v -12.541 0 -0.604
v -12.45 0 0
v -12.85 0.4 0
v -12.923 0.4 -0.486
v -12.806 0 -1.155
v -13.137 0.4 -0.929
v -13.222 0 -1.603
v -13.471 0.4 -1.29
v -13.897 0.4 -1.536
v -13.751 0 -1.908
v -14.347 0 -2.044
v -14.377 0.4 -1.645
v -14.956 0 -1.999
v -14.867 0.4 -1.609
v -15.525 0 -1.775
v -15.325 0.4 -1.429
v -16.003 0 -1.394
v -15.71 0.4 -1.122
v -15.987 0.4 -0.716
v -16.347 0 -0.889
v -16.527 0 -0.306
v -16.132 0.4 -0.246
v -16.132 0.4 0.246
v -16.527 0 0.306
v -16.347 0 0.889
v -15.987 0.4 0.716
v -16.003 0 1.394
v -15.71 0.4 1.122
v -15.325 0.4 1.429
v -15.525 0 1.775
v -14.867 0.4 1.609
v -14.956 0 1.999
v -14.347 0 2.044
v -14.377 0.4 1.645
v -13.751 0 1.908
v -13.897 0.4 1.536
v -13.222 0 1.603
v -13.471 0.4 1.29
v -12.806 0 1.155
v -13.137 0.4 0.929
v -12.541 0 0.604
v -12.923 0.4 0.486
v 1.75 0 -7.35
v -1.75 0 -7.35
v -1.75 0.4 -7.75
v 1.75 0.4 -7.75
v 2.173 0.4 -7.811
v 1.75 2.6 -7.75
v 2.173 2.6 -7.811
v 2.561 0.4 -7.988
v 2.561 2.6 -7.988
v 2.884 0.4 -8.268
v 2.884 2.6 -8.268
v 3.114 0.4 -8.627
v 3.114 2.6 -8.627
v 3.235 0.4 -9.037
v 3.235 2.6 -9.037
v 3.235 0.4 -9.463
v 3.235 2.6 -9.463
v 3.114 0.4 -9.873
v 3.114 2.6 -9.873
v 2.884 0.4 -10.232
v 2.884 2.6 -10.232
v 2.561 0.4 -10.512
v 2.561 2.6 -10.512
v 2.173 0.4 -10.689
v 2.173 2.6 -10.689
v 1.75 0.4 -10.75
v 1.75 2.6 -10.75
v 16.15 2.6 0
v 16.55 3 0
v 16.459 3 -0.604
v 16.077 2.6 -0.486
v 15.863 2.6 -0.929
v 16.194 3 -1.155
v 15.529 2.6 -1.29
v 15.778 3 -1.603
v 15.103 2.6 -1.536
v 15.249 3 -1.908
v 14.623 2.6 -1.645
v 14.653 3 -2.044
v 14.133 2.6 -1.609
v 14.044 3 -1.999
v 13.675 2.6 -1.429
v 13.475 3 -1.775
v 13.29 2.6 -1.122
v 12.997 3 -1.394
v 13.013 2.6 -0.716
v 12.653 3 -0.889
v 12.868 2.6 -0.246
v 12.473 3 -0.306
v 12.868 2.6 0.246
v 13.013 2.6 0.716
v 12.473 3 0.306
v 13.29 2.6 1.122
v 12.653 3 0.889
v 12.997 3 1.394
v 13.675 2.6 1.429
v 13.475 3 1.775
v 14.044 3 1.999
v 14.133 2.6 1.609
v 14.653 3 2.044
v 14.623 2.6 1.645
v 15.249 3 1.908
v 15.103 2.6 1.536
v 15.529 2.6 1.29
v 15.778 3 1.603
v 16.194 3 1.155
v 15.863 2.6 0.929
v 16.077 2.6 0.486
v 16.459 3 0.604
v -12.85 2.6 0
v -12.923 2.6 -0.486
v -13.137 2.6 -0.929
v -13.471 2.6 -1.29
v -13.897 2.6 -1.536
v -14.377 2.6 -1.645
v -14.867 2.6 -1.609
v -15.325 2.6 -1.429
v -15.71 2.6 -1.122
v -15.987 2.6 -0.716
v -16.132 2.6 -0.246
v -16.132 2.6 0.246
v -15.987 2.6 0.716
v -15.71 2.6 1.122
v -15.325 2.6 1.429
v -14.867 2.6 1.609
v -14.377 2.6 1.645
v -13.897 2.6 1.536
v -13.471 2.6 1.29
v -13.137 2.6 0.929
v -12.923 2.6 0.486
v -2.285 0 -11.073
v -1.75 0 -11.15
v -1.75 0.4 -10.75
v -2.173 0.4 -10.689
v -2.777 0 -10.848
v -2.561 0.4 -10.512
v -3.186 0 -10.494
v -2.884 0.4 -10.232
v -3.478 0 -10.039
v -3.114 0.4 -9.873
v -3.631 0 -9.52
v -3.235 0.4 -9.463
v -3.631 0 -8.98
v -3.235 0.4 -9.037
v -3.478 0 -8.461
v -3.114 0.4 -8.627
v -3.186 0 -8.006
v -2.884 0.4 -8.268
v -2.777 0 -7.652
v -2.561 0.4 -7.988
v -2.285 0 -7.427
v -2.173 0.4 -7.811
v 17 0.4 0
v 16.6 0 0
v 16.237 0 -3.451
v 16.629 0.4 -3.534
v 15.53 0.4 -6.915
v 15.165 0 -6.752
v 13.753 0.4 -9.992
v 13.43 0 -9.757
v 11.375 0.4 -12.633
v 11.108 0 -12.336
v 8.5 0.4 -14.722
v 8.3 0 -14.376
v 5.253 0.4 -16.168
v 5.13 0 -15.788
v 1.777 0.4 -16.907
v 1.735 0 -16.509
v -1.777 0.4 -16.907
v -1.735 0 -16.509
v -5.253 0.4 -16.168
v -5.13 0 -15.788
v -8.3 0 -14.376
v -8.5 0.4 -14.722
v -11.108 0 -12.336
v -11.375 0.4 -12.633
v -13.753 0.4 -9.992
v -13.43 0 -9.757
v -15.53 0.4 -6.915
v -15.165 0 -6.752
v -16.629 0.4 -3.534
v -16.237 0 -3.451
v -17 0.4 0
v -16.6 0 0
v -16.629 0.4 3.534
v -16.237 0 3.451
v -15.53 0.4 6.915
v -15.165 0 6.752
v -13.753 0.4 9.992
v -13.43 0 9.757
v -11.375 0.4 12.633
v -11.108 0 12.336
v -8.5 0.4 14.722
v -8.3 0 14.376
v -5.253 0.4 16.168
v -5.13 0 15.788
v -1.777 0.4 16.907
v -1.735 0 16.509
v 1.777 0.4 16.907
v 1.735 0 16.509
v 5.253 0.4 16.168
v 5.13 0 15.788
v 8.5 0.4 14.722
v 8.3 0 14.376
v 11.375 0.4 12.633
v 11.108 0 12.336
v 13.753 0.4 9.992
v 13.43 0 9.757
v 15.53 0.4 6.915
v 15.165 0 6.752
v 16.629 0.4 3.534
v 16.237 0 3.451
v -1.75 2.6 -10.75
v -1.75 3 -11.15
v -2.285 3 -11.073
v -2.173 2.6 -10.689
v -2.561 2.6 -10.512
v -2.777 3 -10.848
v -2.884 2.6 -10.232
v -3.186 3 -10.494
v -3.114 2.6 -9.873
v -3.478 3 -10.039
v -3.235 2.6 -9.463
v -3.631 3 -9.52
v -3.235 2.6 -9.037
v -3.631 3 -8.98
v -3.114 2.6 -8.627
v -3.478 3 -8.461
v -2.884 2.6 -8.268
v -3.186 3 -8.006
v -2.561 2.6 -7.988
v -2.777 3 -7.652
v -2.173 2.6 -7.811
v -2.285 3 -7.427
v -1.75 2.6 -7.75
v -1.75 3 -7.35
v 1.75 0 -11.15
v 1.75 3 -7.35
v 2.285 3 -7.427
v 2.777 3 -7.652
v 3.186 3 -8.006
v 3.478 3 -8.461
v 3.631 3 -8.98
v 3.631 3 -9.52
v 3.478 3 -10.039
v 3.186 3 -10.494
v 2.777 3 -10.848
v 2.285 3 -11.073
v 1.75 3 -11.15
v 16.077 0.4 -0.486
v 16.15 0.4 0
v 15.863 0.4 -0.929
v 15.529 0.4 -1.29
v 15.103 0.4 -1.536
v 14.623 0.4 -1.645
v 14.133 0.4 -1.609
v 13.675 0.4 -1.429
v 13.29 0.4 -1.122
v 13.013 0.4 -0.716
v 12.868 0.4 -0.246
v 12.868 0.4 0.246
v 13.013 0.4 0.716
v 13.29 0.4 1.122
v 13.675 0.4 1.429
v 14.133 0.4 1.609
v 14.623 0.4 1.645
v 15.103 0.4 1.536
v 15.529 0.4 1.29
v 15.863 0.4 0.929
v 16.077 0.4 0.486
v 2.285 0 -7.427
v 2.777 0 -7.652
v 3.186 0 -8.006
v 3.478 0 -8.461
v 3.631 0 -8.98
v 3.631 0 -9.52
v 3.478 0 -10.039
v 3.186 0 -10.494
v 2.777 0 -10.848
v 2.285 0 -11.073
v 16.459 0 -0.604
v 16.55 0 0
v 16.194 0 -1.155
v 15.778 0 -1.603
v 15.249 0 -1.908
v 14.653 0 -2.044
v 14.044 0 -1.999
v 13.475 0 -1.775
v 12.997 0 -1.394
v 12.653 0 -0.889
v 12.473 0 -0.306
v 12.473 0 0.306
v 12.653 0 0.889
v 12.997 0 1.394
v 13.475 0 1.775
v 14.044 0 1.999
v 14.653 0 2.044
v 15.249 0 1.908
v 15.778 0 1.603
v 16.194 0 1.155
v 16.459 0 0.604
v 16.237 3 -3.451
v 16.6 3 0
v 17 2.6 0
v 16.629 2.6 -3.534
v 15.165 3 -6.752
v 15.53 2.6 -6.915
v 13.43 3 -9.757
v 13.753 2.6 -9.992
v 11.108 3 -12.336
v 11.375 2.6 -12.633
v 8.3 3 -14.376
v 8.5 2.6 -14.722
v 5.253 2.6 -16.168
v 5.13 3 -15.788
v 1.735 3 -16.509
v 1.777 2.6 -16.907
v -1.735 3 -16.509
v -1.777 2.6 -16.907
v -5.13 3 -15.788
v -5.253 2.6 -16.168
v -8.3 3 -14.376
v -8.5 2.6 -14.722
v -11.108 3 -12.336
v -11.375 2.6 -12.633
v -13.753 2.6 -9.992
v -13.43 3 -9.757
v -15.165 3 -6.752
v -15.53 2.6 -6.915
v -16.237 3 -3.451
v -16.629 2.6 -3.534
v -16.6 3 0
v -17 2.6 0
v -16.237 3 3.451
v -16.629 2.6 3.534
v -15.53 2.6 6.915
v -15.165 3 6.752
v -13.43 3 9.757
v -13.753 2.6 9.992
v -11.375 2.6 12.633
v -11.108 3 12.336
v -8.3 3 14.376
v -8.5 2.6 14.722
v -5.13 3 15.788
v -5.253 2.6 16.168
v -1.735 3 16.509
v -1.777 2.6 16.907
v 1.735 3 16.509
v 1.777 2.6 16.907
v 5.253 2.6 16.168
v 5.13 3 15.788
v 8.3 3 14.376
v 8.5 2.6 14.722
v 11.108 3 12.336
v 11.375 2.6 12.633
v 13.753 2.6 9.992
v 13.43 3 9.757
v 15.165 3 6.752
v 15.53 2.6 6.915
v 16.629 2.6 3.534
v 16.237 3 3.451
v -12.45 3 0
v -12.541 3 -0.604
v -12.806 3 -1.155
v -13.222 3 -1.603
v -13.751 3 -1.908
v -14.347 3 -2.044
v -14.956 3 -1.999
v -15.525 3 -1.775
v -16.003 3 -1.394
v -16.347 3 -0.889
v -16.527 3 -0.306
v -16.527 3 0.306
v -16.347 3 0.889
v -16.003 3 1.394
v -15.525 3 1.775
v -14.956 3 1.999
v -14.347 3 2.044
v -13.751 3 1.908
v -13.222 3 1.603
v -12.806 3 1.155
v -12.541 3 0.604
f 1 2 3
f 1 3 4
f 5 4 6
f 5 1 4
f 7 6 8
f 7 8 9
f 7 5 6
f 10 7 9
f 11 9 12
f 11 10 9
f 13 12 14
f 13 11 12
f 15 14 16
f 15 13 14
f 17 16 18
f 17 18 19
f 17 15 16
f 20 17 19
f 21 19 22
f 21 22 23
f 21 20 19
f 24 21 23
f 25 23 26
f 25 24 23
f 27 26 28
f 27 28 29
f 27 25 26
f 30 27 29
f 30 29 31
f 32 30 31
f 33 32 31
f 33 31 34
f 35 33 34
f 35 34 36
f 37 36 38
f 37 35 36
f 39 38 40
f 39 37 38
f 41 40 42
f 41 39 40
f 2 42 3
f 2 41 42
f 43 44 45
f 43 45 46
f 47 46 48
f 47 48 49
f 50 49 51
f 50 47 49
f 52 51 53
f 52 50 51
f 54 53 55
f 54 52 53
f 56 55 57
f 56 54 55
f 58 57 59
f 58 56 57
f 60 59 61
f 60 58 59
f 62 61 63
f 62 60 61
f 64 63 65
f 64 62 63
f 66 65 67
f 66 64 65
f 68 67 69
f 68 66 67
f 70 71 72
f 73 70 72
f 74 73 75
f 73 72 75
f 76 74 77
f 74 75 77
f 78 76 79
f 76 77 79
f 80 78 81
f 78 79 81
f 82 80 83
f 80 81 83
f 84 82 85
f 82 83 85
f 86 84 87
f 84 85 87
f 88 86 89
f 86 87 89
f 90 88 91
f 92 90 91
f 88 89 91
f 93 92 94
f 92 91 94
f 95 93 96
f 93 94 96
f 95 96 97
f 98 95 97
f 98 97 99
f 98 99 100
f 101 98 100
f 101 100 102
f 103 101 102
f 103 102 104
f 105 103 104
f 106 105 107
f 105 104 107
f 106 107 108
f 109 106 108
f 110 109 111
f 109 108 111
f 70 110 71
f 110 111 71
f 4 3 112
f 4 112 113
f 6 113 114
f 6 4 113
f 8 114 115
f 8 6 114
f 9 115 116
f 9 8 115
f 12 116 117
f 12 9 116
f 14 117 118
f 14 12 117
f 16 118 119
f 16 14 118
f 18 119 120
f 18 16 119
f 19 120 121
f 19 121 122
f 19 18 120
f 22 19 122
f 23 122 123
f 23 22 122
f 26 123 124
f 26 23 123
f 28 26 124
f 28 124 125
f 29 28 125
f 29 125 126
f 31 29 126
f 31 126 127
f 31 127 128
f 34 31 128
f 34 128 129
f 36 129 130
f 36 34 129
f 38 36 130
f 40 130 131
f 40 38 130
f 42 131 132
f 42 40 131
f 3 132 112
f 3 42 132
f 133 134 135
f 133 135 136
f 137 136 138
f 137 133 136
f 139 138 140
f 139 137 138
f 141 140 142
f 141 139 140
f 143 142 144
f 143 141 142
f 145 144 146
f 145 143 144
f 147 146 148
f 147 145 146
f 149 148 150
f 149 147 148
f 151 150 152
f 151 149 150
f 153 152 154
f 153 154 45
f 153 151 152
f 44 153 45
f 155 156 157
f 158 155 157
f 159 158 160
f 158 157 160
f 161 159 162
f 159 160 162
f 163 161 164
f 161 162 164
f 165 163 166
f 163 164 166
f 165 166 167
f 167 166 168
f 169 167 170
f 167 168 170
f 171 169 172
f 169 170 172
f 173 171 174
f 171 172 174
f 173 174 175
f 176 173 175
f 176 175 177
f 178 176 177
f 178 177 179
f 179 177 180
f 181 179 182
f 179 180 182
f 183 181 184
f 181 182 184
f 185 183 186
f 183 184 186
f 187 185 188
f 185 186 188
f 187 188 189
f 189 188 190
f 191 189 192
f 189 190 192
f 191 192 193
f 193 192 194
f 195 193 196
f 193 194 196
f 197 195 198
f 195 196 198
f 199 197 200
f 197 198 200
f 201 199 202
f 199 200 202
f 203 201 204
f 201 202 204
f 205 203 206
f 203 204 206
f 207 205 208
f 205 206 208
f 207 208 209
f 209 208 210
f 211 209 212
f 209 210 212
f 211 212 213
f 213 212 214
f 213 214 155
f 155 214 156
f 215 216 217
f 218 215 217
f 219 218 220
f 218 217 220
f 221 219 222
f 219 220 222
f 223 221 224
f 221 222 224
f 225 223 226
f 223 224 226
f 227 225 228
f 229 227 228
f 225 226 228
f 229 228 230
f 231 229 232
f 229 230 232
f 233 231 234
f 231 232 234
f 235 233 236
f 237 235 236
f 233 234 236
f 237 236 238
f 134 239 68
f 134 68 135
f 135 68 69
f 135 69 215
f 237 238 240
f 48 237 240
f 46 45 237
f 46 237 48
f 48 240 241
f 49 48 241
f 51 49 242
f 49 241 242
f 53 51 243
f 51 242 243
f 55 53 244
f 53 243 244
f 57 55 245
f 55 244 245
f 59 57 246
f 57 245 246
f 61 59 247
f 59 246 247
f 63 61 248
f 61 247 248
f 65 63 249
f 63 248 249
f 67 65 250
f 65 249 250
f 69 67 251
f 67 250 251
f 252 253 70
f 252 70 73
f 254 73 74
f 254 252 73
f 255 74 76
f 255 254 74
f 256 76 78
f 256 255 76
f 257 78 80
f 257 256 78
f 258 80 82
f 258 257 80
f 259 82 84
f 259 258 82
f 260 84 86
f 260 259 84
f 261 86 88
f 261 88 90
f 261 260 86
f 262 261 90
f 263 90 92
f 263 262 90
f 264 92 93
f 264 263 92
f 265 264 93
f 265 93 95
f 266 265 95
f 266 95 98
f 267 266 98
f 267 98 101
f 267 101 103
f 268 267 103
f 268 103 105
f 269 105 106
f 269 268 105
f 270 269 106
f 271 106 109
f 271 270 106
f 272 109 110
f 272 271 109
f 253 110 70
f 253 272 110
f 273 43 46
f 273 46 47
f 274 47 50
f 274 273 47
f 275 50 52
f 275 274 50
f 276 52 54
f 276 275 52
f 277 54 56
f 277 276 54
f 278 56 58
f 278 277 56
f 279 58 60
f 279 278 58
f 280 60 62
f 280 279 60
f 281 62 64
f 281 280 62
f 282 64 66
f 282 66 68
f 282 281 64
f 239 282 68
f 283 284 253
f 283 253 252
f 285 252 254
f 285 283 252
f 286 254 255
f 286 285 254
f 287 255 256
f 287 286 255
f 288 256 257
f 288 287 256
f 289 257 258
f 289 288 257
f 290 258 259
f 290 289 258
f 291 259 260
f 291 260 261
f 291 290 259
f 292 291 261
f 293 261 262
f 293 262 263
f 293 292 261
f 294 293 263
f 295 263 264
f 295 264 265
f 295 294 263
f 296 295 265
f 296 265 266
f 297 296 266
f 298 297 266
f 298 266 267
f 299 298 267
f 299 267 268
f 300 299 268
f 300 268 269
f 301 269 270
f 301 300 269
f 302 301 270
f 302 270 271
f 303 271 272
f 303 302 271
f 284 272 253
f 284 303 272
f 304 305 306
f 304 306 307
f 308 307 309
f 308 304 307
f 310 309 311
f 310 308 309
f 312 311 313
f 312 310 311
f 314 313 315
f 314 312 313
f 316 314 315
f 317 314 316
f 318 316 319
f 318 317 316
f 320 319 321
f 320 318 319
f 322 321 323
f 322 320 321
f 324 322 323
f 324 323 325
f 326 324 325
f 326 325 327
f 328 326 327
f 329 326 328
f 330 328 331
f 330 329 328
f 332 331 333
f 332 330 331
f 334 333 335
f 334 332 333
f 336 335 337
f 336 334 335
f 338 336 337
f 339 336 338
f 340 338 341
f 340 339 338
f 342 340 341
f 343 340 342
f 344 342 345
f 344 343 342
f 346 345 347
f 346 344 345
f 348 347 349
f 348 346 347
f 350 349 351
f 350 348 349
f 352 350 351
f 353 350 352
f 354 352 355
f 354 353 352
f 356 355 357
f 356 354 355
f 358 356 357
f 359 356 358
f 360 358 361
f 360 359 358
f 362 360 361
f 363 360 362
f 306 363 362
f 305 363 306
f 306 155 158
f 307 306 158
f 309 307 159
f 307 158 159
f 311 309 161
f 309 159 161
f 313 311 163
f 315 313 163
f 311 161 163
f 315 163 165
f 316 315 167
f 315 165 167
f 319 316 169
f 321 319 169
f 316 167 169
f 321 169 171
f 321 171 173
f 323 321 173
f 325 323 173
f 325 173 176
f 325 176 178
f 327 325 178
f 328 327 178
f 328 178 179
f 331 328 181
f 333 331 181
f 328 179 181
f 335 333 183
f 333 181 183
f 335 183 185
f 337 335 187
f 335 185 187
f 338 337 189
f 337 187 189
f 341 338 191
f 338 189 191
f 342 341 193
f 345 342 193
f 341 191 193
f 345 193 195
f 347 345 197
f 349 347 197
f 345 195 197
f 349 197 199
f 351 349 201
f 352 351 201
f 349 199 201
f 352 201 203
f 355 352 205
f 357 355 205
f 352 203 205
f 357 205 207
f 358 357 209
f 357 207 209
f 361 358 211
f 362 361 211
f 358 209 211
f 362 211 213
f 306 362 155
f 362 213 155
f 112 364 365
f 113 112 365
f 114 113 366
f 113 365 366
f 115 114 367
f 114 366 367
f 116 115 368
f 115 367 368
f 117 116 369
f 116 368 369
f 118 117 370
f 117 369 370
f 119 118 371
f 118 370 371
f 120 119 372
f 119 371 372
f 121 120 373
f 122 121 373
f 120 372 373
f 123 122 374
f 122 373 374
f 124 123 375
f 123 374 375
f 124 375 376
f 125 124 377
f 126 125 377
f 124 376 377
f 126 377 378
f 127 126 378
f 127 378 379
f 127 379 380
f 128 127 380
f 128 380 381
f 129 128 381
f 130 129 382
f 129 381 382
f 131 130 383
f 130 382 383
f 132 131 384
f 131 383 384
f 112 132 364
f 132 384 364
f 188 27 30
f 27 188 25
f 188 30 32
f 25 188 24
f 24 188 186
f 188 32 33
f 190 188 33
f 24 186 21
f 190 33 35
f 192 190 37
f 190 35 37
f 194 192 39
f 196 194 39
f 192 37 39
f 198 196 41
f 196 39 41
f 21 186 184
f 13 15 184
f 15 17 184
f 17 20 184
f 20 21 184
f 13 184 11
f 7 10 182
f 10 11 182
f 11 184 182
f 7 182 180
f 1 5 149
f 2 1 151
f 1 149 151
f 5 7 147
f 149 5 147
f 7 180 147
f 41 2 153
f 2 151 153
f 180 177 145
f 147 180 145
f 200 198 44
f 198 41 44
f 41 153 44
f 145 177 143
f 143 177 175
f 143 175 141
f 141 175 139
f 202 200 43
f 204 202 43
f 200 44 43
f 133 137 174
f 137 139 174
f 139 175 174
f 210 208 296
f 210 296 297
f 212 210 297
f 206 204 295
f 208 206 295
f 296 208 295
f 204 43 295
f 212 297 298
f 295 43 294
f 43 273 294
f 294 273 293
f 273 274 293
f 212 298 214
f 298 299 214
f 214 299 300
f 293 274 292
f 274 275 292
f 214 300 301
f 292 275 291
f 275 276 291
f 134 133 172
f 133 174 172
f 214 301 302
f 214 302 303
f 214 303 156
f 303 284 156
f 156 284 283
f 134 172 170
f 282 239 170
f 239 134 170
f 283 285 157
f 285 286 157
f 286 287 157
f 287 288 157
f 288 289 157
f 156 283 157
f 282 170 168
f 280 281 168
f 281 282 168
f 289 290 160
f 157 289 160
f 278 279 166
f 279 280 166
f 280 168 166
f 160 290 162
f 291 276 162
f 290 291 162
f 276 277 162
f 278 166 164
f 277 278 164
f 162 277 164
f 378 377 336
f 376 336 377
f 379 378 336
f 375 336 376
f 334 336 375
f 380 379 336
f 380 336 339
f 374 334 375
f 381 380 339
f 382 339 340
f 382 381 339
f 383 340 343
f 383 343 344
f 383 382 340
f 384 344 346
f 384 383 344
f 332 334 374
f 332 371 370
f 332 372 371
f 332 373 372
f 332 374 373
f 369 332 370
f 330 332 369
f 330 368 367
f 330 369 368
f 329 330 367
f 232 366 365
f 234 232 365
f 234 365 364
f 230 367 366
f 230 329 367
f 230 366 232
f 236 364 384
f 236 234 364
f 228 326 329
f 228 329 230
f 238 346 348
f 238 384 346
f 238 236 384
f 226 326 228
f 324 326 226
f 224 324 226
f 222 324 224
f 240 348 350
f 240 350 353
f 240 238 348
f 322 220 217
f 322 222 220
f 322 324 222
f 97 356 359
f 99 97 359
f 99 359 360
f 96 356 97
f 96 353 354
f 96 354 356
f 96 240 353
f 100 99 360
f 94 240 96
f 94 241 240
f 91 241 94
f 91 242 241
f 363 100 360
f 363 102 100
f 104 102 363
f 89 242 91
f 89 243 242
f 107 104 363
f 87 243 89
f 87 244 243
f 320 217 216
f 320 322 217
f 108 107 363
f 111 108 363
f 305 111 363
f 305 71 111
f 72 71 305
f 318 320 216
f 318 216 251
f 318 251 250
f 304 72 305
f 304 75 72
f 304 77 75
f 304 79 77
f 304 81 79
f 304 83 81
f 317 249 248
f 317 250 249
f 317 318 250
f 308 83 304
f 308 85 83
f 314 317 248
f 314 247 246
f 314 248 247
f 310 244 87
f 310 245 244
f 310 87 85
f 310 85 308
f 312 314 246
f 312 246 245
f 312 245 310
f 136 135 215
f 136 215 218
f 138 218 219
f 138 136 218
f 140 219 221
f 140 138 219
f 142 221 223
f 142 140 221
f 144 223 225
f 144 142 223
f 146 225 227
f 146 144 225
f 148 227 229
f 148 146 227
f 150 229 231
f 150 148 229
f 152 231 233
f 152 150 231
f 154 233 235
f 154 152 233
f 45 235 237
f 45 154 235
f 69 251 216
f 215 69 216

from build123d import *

# Parameters (mm, degrees)
SKETCH1_R           = 17
SKETCH1_R_2         = 1.65
BOSS_EXTRUDE1_DEPTH = 3
CHAMFER1_SIZE       = 0.4


with BuildPart() as part:
    # Sketch1 → Boss-Extrude1 (new body)
    with BuildSketch(Plane(origin=(0, 0, 0), x_dir=(1, 0, 0), z_dir=(0, 1, 0))):
        Circle(SKETCH1_R)
        with Locations((-14.5, 0)):
            Circle(SKETCH1_R_2, mode=Mode.SUBTRACT)
        with Locations((14.5, 0)):
            Circle(SKETCH1_R_2, mode=Mode.SUBTRACT)
        with BuildLine():
            Line((-1.75, 7.75), (1.75, 7.75))
            ThreePointArc((1.75, 7.75), (3.25, 9.25), (1.75, 10.75))
            Line((1.75, 10.75), (-1.75, 10.75))
            ThreePointArc((-1.75, 10.75), (-3.25, 9.25), (-1.75, 7.75))
        make_face(mode=Mode.SUBTRACT)
    extrude(amount=BOSS_EXTRUDE1_DEPTH)

    # Chamfer1
    chamfer1_edges = [part.edges().sort_by_distance(p)[0] for p in [
        (-3.25, 3, -9.25),
        (0, 3, -7.75),
        (-16.15, 0, 0),
        (-16.15, 3, 0),
        (-17, 0, 0),
        (12.85, 0, 0),
        (12.85, 3, 0),
        (-17, 3, 0),
        (3.25, 0, -9.25),
        (0, 0, -10.75),
        (-3.25, 0, -9.25),
        (0, 0, -7.75),
        (3.25, 3, -9.25),
        (0, 3, -10.75),
    ]]
    chamfer(chamfer1_edges, length=CHAMFER1_SIZE)


solid = part.part
